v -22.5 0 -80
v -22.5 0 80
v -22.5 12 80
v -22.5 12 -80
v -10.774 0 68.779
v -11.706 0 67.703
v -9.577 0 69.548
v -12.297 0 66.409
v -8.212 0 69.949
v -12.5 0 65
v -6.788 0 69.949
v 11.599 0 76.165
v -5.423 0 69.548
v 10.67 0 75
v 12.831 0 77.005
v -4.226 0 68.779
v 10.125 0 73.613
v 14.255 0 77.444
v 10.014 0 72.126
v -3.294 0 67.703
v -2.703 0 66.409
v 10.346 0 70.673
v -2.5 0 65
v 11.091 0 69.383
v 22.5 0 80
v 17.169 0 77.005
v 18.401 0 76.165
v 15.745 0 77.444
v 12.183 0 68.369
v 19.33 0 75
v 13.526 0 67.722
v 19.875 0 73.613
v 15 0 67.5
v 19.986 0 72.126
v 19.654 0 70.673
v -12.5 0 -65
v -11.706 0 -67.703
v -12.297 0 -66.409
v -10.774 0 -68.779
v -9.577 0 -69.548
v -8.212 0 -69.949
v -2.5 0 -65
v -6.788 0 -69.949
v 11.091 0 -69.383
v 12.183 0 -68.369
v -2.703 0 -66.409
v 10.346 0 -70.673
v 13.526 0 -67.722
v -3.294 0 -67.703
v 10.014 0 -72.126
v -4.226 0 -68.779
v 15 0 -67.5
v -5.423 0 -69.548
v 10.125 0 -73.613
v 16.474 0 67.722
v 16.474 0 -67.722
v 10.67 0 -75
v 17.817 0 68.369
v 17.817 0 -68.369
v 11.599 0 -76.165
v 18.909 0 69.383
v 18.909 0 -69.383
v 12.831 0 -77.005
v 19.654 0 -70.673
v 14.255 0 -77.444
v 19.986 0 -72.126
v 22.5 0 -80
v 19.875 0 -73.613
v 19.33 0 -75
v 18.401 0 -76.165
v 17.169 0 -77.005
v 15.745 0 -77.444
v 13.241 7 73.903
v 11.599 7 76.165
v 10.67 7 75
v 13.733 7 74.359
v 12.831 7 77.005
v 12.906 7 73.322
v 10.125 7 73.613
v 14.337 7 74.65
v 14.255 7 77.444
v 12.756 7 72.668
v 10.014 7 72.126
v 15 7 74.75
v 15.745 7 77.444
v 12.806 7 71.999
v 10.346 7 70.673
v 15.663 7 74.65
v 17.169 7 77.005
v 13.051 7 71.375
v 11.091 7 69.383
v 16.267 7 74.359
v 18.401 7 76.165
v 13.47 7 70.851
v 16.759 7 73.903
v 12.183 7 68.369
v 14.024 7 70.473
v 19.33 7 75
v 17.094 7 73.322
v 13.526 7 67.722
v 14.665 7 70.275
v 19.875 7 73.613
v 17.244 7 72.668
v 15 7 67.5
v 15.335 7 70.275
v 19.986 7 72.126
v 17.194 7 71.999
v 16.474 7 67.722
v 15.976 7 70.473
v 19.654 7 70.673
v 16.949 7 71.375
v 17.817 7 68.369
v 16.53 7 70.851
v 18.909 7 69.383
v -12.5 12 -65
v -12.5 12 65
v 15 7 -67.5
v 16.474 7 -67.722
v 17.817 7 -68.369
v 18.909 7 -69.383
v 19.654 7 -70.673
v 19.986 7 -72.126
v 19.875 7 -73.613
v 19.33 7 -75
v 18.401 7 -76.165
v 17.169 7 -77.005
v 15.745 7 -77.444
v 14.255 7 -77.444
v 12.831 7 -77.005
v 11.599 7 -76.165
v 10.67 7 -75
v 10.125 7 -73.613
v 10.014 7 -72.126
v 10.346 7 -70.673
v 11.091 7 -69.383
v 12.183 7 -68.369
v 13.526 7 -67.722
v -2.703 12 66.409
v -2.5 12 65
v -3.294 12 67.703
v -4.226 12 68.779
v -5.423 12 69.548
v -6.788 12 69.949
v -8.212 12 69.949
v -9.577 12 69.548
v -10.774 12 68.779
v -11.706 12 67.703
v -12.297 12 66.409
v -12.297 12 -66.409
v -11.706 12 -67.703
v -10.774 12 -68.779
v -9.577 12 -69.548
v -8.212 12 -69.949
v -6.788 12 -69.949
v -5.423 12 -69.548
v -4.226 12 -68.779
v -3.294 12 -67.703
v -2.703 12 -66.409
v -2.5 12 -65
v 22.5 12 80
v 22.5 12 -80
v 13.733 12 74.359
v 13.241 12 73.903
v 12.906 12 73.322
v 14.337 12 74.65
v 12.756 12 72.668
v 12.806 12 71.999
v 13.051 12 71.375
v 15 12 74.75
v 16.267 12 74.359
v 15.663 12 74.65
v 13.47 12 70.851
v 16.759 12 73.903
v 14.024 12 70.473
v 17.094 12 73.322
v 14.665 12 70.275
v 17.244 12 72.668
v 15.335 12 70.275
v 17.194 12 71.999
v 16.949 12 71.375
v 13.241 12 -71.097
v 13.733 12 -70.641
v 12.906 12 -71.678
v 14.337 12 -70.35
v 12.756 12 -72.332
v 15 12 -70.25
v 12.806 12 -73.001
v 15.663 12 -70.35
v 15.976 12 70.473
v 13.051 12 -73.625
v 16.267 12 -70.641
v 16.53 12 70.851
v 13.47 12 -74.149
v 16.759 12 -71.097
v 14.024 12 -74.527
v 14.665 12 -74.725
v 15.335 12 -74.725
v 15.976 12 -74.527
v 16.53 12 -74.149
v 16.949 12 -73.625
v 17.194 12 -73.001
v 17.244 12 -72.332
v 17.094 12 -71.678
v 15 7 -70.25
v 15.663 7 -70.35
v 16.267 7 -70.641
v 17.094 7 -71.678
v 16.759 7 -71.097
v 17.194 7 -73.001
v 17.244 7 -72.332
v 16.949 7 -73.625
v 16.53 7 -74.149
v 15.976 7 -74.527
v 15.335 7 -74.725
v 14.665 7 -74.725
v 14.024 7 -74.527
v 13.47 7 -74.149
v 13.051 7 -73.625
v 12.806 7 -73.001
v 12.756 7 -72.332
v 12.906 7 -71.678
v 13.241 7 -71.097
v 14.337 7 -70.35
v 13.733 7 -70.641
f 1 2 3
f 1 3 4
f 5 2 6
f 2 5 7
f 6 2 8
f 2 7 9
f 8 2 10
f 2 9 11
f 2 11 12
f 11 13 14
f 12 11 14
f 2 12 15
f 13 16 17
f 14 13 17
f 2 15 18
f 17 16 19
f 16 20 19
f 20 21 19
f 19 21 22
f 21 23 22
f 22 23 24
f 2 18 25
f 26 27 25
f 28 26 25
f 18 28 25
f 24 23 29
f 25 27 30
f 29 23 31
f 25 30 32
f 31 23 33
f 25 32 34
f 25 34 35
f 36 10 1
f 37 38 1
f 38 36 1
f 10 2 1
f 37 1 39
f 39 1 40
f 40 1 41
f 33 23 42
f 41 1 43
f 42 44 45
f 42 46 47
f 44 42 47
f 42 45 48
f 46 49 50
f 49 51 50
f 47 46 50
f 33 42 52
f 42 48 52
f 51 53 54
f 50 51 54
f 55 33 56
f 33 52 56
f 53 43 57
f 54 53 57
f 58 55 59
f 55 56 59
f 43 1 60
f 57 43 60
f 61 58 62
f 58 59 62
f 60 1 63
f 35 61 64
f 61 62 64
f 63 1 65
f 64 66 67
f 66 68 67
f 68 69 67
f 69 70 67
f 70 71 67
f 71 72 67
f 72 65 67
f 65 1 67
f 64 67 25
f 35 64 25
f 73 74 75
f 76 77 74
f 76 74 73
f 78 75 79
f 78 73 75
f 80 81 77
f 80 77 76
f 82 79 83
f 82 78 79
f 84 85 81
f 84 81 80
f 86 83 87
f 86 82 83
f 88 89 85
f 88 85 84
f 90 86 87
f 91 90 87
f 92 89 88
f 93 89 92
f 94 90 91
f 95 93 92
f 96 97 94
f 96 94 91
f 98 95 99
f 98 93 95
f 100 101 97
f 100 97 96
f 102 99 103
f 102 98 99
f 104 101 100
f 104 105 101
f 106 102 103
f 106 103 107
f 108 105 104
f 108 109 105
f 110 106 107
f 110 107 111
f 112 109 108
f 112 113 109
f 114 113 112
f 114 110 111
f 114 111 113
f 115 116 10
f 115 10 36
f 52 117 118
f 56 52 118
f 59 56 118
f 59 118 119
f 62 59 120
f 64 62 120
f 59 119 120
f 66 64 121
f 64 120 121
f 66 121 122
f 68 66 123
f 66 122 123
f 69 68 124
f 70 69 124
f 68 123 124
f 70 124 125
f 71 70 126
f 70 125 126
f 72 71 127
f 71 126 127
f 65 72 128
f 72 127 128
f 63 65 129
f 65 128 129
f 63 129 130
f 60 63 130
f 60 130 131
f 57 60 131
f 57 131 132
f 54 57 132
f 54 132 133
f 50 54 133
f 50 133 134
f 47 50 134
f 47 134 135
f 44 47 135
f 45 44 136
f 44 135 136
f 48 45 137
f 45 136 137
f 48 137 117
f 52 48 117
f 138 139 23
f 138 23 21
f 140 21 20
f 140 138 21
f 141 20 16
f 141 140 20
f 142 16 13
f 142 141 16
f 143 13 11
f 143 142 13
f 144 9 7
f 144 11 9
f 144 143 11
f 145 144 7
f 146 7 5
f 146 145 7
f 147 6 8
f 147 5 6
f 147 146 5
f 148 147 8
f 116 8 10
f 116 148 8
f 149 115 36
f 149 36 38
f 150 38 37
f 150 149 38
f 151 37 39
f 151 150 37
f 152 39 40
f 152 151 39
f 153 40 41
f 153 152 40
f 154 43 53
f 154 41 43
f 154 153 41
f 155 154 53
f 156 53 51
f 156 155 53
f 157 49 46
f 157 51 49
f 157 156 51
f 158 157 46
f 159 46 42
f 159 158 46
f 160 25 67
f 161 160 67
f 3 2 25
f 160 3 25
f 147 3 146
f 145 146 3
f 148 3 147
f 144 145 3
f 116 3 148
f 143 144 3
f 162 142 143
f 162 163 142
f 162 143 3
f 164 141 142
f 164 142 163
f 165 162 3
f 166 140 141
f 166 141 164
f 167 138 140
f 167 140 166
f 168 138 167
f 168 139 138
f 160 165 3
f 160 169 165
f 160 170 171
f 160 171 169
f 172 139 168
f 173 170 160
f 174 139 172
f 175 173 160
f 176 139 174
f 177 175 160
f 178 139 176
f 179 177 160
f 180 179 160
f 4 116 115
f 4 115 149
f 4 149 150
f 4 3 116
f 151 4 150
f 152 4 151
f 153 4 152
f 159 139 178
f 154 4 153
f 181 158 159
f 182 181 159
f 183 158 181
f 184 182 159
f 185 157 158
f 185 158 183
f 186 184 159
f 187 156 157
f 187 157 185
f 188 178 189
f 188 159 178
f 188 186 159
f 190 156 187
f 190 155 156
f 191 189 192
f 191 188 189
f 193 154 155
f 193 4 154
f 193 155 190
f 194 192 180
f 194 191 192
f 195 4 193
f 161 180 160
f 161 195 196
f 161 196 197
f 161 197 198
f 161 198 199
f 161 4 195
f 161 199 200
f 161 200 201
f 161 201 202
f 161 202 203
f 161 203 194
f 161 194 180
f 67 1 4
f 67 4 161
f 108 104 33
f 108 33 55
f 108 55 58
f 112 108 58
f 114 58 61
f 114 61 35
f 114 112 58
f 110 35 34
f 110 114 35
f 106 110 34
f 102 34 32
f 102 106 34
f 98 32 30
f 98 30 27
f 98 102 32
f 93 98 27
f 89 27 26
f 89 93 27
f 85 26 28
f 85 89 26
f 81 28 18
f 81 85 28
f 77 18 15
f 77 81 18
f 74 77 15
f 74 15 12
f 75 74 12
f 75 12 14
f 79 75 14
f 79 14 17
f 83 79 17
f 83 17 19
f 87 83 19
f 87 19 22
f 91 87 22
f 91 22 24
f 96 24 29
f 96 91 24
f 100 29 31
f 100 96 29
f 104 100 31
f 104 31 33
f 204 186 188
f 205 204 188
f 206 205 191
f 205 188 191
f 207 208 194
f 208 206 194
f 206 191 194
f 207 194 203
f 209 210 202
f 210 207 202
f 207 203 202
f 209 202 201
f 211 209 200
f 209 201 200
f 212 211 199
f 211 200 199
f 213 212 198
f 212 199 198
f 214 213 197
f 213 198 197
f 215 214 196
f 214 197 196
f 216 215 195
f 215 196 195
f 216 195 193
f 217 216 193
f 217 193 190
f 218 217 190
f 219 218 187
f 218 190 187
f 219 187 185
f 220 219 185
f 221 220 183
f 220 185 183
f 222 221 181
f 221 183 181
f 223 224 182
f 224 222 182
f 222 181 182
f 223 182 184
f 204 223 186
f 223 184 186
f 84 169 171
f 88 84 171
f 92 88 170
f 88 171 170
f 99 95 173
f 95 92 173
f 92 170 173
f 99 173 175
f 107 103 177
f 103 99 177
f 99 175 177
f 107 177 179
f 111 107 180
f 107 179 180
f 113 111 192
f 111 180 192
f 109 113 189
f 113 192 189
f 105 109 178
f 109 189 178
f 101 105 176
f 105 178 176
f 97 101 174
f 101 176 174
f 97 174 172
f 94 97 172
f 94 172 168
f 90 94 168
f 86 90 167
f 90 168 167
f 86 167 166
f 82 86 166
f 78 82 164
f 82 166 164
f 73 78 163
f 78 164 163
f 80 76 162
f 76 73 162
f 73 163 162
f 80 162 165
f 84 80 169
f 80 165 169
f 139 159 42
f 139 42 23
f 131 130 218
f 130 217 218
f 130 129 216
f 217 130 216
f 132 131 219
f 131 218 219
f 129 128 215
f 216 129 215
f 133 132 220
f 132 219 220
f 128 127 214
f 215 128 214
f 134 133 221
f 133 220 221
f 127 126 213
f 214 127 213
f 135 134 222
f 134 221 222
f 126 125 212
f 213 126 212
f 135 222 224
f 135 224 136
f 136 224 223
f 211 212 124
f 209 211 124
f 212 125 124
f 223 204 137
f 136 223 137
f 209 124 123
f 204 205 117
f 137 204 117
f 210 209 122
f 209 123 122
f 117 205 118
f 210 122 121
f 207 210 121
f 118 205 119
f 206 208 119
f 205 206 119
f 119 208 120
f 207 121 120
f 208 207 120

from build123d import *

# Parameters (mm, degrees)
SKETCH2_W           = 45
SKETCH2_H           = 160
BOSS_EXTRUDE3_DEPTH = 12
SKETCH3_R           = 2.25
CUT_EXTRUDE3_DEPTH  = 5
SKETCH5_R           = 5
CUT_EXTRUDE5_DEPTH  = 7
CUT_EXTRUDE6_DEPTH  = 84.965766834


with BuildPart() as part:
    # Sketch2 → Boss-Extrude3 (new body)
    with BuildSketch(Plane(origin=(0, 0, 0), x_dir=(1, 0, 0), z_dir=(0, 1, 0))):
        Rectangle(SKETCH2_W, SKETCH2_H)
    extrude(amount=BOSS_EXTRUDE3_DEPTH)

    # Sketch3 → Cut-Extrude3 (cut)
    with BuildSketch(Plane(origin=(0, 12, 0), x_dir=(1, 0, 0), z_dir=(0, 1, 0))):
        with Locations(Location((15, 72.5, 0), (0, 0, 270))):
            Circle(SKETCH3_R)
        with Locations(Location((15, -72.5, 0), (0, 0, 270))):
            Circle(SKETCH3_R)
    cut_extrude3 = extrude(amount=-CUT_EXTRUDE3_DEPTH, mode=Mode.SUBTRACT)

    # Sketch5 → Cut-Extrude5 (cut)
    with BuildSketch(Plane(origin=(0, 7, 0), x_dir=(1, 0, 0), z_dir=(0, 1, 0))):
        with Locations(Location((15, 72.5, 0), (0, 0, 270))):
            Circle(SKETCH5_R)
    cut_extrude5 = extrude(amount=-CUT_EXTRUDE5_DEPTH, mode=Mode.SUBTRACT)

    # Mirror1: Cut-Extrude3, Cut-Extrude5 across plane
    add(cut_extrude3.mirror(Plane.XY), mode=Mode.SUBTRACT)
    add(cut_extrude5.mirror(Plane.XY), mode=Mode.SUBTRACT)

    # Sketch6 → Cut-Extrude6 (cut, through all)
    with BuildSketch(Plane(origin=(0, 12, 0), x_dir=(1, 0, 0), z_dir=(0, 1, 0))):
        with BuildLine():
            Line((-12.5, -65), (-12.5, 65))
            ThreePointArc((-12.5, 65), (-7.5, 70), (-2.5, 65))
            Line((-2.5, 65), (-2.5, -65))
            ThreePointArc((-2.5, -65), (-7.5, -70), (-12.5, -65))
        make_face()
    extrude(amount=-CUT_EXTRUDE6_DEPTH, mode=Mode.SUBTRACT)


solid = part.part
